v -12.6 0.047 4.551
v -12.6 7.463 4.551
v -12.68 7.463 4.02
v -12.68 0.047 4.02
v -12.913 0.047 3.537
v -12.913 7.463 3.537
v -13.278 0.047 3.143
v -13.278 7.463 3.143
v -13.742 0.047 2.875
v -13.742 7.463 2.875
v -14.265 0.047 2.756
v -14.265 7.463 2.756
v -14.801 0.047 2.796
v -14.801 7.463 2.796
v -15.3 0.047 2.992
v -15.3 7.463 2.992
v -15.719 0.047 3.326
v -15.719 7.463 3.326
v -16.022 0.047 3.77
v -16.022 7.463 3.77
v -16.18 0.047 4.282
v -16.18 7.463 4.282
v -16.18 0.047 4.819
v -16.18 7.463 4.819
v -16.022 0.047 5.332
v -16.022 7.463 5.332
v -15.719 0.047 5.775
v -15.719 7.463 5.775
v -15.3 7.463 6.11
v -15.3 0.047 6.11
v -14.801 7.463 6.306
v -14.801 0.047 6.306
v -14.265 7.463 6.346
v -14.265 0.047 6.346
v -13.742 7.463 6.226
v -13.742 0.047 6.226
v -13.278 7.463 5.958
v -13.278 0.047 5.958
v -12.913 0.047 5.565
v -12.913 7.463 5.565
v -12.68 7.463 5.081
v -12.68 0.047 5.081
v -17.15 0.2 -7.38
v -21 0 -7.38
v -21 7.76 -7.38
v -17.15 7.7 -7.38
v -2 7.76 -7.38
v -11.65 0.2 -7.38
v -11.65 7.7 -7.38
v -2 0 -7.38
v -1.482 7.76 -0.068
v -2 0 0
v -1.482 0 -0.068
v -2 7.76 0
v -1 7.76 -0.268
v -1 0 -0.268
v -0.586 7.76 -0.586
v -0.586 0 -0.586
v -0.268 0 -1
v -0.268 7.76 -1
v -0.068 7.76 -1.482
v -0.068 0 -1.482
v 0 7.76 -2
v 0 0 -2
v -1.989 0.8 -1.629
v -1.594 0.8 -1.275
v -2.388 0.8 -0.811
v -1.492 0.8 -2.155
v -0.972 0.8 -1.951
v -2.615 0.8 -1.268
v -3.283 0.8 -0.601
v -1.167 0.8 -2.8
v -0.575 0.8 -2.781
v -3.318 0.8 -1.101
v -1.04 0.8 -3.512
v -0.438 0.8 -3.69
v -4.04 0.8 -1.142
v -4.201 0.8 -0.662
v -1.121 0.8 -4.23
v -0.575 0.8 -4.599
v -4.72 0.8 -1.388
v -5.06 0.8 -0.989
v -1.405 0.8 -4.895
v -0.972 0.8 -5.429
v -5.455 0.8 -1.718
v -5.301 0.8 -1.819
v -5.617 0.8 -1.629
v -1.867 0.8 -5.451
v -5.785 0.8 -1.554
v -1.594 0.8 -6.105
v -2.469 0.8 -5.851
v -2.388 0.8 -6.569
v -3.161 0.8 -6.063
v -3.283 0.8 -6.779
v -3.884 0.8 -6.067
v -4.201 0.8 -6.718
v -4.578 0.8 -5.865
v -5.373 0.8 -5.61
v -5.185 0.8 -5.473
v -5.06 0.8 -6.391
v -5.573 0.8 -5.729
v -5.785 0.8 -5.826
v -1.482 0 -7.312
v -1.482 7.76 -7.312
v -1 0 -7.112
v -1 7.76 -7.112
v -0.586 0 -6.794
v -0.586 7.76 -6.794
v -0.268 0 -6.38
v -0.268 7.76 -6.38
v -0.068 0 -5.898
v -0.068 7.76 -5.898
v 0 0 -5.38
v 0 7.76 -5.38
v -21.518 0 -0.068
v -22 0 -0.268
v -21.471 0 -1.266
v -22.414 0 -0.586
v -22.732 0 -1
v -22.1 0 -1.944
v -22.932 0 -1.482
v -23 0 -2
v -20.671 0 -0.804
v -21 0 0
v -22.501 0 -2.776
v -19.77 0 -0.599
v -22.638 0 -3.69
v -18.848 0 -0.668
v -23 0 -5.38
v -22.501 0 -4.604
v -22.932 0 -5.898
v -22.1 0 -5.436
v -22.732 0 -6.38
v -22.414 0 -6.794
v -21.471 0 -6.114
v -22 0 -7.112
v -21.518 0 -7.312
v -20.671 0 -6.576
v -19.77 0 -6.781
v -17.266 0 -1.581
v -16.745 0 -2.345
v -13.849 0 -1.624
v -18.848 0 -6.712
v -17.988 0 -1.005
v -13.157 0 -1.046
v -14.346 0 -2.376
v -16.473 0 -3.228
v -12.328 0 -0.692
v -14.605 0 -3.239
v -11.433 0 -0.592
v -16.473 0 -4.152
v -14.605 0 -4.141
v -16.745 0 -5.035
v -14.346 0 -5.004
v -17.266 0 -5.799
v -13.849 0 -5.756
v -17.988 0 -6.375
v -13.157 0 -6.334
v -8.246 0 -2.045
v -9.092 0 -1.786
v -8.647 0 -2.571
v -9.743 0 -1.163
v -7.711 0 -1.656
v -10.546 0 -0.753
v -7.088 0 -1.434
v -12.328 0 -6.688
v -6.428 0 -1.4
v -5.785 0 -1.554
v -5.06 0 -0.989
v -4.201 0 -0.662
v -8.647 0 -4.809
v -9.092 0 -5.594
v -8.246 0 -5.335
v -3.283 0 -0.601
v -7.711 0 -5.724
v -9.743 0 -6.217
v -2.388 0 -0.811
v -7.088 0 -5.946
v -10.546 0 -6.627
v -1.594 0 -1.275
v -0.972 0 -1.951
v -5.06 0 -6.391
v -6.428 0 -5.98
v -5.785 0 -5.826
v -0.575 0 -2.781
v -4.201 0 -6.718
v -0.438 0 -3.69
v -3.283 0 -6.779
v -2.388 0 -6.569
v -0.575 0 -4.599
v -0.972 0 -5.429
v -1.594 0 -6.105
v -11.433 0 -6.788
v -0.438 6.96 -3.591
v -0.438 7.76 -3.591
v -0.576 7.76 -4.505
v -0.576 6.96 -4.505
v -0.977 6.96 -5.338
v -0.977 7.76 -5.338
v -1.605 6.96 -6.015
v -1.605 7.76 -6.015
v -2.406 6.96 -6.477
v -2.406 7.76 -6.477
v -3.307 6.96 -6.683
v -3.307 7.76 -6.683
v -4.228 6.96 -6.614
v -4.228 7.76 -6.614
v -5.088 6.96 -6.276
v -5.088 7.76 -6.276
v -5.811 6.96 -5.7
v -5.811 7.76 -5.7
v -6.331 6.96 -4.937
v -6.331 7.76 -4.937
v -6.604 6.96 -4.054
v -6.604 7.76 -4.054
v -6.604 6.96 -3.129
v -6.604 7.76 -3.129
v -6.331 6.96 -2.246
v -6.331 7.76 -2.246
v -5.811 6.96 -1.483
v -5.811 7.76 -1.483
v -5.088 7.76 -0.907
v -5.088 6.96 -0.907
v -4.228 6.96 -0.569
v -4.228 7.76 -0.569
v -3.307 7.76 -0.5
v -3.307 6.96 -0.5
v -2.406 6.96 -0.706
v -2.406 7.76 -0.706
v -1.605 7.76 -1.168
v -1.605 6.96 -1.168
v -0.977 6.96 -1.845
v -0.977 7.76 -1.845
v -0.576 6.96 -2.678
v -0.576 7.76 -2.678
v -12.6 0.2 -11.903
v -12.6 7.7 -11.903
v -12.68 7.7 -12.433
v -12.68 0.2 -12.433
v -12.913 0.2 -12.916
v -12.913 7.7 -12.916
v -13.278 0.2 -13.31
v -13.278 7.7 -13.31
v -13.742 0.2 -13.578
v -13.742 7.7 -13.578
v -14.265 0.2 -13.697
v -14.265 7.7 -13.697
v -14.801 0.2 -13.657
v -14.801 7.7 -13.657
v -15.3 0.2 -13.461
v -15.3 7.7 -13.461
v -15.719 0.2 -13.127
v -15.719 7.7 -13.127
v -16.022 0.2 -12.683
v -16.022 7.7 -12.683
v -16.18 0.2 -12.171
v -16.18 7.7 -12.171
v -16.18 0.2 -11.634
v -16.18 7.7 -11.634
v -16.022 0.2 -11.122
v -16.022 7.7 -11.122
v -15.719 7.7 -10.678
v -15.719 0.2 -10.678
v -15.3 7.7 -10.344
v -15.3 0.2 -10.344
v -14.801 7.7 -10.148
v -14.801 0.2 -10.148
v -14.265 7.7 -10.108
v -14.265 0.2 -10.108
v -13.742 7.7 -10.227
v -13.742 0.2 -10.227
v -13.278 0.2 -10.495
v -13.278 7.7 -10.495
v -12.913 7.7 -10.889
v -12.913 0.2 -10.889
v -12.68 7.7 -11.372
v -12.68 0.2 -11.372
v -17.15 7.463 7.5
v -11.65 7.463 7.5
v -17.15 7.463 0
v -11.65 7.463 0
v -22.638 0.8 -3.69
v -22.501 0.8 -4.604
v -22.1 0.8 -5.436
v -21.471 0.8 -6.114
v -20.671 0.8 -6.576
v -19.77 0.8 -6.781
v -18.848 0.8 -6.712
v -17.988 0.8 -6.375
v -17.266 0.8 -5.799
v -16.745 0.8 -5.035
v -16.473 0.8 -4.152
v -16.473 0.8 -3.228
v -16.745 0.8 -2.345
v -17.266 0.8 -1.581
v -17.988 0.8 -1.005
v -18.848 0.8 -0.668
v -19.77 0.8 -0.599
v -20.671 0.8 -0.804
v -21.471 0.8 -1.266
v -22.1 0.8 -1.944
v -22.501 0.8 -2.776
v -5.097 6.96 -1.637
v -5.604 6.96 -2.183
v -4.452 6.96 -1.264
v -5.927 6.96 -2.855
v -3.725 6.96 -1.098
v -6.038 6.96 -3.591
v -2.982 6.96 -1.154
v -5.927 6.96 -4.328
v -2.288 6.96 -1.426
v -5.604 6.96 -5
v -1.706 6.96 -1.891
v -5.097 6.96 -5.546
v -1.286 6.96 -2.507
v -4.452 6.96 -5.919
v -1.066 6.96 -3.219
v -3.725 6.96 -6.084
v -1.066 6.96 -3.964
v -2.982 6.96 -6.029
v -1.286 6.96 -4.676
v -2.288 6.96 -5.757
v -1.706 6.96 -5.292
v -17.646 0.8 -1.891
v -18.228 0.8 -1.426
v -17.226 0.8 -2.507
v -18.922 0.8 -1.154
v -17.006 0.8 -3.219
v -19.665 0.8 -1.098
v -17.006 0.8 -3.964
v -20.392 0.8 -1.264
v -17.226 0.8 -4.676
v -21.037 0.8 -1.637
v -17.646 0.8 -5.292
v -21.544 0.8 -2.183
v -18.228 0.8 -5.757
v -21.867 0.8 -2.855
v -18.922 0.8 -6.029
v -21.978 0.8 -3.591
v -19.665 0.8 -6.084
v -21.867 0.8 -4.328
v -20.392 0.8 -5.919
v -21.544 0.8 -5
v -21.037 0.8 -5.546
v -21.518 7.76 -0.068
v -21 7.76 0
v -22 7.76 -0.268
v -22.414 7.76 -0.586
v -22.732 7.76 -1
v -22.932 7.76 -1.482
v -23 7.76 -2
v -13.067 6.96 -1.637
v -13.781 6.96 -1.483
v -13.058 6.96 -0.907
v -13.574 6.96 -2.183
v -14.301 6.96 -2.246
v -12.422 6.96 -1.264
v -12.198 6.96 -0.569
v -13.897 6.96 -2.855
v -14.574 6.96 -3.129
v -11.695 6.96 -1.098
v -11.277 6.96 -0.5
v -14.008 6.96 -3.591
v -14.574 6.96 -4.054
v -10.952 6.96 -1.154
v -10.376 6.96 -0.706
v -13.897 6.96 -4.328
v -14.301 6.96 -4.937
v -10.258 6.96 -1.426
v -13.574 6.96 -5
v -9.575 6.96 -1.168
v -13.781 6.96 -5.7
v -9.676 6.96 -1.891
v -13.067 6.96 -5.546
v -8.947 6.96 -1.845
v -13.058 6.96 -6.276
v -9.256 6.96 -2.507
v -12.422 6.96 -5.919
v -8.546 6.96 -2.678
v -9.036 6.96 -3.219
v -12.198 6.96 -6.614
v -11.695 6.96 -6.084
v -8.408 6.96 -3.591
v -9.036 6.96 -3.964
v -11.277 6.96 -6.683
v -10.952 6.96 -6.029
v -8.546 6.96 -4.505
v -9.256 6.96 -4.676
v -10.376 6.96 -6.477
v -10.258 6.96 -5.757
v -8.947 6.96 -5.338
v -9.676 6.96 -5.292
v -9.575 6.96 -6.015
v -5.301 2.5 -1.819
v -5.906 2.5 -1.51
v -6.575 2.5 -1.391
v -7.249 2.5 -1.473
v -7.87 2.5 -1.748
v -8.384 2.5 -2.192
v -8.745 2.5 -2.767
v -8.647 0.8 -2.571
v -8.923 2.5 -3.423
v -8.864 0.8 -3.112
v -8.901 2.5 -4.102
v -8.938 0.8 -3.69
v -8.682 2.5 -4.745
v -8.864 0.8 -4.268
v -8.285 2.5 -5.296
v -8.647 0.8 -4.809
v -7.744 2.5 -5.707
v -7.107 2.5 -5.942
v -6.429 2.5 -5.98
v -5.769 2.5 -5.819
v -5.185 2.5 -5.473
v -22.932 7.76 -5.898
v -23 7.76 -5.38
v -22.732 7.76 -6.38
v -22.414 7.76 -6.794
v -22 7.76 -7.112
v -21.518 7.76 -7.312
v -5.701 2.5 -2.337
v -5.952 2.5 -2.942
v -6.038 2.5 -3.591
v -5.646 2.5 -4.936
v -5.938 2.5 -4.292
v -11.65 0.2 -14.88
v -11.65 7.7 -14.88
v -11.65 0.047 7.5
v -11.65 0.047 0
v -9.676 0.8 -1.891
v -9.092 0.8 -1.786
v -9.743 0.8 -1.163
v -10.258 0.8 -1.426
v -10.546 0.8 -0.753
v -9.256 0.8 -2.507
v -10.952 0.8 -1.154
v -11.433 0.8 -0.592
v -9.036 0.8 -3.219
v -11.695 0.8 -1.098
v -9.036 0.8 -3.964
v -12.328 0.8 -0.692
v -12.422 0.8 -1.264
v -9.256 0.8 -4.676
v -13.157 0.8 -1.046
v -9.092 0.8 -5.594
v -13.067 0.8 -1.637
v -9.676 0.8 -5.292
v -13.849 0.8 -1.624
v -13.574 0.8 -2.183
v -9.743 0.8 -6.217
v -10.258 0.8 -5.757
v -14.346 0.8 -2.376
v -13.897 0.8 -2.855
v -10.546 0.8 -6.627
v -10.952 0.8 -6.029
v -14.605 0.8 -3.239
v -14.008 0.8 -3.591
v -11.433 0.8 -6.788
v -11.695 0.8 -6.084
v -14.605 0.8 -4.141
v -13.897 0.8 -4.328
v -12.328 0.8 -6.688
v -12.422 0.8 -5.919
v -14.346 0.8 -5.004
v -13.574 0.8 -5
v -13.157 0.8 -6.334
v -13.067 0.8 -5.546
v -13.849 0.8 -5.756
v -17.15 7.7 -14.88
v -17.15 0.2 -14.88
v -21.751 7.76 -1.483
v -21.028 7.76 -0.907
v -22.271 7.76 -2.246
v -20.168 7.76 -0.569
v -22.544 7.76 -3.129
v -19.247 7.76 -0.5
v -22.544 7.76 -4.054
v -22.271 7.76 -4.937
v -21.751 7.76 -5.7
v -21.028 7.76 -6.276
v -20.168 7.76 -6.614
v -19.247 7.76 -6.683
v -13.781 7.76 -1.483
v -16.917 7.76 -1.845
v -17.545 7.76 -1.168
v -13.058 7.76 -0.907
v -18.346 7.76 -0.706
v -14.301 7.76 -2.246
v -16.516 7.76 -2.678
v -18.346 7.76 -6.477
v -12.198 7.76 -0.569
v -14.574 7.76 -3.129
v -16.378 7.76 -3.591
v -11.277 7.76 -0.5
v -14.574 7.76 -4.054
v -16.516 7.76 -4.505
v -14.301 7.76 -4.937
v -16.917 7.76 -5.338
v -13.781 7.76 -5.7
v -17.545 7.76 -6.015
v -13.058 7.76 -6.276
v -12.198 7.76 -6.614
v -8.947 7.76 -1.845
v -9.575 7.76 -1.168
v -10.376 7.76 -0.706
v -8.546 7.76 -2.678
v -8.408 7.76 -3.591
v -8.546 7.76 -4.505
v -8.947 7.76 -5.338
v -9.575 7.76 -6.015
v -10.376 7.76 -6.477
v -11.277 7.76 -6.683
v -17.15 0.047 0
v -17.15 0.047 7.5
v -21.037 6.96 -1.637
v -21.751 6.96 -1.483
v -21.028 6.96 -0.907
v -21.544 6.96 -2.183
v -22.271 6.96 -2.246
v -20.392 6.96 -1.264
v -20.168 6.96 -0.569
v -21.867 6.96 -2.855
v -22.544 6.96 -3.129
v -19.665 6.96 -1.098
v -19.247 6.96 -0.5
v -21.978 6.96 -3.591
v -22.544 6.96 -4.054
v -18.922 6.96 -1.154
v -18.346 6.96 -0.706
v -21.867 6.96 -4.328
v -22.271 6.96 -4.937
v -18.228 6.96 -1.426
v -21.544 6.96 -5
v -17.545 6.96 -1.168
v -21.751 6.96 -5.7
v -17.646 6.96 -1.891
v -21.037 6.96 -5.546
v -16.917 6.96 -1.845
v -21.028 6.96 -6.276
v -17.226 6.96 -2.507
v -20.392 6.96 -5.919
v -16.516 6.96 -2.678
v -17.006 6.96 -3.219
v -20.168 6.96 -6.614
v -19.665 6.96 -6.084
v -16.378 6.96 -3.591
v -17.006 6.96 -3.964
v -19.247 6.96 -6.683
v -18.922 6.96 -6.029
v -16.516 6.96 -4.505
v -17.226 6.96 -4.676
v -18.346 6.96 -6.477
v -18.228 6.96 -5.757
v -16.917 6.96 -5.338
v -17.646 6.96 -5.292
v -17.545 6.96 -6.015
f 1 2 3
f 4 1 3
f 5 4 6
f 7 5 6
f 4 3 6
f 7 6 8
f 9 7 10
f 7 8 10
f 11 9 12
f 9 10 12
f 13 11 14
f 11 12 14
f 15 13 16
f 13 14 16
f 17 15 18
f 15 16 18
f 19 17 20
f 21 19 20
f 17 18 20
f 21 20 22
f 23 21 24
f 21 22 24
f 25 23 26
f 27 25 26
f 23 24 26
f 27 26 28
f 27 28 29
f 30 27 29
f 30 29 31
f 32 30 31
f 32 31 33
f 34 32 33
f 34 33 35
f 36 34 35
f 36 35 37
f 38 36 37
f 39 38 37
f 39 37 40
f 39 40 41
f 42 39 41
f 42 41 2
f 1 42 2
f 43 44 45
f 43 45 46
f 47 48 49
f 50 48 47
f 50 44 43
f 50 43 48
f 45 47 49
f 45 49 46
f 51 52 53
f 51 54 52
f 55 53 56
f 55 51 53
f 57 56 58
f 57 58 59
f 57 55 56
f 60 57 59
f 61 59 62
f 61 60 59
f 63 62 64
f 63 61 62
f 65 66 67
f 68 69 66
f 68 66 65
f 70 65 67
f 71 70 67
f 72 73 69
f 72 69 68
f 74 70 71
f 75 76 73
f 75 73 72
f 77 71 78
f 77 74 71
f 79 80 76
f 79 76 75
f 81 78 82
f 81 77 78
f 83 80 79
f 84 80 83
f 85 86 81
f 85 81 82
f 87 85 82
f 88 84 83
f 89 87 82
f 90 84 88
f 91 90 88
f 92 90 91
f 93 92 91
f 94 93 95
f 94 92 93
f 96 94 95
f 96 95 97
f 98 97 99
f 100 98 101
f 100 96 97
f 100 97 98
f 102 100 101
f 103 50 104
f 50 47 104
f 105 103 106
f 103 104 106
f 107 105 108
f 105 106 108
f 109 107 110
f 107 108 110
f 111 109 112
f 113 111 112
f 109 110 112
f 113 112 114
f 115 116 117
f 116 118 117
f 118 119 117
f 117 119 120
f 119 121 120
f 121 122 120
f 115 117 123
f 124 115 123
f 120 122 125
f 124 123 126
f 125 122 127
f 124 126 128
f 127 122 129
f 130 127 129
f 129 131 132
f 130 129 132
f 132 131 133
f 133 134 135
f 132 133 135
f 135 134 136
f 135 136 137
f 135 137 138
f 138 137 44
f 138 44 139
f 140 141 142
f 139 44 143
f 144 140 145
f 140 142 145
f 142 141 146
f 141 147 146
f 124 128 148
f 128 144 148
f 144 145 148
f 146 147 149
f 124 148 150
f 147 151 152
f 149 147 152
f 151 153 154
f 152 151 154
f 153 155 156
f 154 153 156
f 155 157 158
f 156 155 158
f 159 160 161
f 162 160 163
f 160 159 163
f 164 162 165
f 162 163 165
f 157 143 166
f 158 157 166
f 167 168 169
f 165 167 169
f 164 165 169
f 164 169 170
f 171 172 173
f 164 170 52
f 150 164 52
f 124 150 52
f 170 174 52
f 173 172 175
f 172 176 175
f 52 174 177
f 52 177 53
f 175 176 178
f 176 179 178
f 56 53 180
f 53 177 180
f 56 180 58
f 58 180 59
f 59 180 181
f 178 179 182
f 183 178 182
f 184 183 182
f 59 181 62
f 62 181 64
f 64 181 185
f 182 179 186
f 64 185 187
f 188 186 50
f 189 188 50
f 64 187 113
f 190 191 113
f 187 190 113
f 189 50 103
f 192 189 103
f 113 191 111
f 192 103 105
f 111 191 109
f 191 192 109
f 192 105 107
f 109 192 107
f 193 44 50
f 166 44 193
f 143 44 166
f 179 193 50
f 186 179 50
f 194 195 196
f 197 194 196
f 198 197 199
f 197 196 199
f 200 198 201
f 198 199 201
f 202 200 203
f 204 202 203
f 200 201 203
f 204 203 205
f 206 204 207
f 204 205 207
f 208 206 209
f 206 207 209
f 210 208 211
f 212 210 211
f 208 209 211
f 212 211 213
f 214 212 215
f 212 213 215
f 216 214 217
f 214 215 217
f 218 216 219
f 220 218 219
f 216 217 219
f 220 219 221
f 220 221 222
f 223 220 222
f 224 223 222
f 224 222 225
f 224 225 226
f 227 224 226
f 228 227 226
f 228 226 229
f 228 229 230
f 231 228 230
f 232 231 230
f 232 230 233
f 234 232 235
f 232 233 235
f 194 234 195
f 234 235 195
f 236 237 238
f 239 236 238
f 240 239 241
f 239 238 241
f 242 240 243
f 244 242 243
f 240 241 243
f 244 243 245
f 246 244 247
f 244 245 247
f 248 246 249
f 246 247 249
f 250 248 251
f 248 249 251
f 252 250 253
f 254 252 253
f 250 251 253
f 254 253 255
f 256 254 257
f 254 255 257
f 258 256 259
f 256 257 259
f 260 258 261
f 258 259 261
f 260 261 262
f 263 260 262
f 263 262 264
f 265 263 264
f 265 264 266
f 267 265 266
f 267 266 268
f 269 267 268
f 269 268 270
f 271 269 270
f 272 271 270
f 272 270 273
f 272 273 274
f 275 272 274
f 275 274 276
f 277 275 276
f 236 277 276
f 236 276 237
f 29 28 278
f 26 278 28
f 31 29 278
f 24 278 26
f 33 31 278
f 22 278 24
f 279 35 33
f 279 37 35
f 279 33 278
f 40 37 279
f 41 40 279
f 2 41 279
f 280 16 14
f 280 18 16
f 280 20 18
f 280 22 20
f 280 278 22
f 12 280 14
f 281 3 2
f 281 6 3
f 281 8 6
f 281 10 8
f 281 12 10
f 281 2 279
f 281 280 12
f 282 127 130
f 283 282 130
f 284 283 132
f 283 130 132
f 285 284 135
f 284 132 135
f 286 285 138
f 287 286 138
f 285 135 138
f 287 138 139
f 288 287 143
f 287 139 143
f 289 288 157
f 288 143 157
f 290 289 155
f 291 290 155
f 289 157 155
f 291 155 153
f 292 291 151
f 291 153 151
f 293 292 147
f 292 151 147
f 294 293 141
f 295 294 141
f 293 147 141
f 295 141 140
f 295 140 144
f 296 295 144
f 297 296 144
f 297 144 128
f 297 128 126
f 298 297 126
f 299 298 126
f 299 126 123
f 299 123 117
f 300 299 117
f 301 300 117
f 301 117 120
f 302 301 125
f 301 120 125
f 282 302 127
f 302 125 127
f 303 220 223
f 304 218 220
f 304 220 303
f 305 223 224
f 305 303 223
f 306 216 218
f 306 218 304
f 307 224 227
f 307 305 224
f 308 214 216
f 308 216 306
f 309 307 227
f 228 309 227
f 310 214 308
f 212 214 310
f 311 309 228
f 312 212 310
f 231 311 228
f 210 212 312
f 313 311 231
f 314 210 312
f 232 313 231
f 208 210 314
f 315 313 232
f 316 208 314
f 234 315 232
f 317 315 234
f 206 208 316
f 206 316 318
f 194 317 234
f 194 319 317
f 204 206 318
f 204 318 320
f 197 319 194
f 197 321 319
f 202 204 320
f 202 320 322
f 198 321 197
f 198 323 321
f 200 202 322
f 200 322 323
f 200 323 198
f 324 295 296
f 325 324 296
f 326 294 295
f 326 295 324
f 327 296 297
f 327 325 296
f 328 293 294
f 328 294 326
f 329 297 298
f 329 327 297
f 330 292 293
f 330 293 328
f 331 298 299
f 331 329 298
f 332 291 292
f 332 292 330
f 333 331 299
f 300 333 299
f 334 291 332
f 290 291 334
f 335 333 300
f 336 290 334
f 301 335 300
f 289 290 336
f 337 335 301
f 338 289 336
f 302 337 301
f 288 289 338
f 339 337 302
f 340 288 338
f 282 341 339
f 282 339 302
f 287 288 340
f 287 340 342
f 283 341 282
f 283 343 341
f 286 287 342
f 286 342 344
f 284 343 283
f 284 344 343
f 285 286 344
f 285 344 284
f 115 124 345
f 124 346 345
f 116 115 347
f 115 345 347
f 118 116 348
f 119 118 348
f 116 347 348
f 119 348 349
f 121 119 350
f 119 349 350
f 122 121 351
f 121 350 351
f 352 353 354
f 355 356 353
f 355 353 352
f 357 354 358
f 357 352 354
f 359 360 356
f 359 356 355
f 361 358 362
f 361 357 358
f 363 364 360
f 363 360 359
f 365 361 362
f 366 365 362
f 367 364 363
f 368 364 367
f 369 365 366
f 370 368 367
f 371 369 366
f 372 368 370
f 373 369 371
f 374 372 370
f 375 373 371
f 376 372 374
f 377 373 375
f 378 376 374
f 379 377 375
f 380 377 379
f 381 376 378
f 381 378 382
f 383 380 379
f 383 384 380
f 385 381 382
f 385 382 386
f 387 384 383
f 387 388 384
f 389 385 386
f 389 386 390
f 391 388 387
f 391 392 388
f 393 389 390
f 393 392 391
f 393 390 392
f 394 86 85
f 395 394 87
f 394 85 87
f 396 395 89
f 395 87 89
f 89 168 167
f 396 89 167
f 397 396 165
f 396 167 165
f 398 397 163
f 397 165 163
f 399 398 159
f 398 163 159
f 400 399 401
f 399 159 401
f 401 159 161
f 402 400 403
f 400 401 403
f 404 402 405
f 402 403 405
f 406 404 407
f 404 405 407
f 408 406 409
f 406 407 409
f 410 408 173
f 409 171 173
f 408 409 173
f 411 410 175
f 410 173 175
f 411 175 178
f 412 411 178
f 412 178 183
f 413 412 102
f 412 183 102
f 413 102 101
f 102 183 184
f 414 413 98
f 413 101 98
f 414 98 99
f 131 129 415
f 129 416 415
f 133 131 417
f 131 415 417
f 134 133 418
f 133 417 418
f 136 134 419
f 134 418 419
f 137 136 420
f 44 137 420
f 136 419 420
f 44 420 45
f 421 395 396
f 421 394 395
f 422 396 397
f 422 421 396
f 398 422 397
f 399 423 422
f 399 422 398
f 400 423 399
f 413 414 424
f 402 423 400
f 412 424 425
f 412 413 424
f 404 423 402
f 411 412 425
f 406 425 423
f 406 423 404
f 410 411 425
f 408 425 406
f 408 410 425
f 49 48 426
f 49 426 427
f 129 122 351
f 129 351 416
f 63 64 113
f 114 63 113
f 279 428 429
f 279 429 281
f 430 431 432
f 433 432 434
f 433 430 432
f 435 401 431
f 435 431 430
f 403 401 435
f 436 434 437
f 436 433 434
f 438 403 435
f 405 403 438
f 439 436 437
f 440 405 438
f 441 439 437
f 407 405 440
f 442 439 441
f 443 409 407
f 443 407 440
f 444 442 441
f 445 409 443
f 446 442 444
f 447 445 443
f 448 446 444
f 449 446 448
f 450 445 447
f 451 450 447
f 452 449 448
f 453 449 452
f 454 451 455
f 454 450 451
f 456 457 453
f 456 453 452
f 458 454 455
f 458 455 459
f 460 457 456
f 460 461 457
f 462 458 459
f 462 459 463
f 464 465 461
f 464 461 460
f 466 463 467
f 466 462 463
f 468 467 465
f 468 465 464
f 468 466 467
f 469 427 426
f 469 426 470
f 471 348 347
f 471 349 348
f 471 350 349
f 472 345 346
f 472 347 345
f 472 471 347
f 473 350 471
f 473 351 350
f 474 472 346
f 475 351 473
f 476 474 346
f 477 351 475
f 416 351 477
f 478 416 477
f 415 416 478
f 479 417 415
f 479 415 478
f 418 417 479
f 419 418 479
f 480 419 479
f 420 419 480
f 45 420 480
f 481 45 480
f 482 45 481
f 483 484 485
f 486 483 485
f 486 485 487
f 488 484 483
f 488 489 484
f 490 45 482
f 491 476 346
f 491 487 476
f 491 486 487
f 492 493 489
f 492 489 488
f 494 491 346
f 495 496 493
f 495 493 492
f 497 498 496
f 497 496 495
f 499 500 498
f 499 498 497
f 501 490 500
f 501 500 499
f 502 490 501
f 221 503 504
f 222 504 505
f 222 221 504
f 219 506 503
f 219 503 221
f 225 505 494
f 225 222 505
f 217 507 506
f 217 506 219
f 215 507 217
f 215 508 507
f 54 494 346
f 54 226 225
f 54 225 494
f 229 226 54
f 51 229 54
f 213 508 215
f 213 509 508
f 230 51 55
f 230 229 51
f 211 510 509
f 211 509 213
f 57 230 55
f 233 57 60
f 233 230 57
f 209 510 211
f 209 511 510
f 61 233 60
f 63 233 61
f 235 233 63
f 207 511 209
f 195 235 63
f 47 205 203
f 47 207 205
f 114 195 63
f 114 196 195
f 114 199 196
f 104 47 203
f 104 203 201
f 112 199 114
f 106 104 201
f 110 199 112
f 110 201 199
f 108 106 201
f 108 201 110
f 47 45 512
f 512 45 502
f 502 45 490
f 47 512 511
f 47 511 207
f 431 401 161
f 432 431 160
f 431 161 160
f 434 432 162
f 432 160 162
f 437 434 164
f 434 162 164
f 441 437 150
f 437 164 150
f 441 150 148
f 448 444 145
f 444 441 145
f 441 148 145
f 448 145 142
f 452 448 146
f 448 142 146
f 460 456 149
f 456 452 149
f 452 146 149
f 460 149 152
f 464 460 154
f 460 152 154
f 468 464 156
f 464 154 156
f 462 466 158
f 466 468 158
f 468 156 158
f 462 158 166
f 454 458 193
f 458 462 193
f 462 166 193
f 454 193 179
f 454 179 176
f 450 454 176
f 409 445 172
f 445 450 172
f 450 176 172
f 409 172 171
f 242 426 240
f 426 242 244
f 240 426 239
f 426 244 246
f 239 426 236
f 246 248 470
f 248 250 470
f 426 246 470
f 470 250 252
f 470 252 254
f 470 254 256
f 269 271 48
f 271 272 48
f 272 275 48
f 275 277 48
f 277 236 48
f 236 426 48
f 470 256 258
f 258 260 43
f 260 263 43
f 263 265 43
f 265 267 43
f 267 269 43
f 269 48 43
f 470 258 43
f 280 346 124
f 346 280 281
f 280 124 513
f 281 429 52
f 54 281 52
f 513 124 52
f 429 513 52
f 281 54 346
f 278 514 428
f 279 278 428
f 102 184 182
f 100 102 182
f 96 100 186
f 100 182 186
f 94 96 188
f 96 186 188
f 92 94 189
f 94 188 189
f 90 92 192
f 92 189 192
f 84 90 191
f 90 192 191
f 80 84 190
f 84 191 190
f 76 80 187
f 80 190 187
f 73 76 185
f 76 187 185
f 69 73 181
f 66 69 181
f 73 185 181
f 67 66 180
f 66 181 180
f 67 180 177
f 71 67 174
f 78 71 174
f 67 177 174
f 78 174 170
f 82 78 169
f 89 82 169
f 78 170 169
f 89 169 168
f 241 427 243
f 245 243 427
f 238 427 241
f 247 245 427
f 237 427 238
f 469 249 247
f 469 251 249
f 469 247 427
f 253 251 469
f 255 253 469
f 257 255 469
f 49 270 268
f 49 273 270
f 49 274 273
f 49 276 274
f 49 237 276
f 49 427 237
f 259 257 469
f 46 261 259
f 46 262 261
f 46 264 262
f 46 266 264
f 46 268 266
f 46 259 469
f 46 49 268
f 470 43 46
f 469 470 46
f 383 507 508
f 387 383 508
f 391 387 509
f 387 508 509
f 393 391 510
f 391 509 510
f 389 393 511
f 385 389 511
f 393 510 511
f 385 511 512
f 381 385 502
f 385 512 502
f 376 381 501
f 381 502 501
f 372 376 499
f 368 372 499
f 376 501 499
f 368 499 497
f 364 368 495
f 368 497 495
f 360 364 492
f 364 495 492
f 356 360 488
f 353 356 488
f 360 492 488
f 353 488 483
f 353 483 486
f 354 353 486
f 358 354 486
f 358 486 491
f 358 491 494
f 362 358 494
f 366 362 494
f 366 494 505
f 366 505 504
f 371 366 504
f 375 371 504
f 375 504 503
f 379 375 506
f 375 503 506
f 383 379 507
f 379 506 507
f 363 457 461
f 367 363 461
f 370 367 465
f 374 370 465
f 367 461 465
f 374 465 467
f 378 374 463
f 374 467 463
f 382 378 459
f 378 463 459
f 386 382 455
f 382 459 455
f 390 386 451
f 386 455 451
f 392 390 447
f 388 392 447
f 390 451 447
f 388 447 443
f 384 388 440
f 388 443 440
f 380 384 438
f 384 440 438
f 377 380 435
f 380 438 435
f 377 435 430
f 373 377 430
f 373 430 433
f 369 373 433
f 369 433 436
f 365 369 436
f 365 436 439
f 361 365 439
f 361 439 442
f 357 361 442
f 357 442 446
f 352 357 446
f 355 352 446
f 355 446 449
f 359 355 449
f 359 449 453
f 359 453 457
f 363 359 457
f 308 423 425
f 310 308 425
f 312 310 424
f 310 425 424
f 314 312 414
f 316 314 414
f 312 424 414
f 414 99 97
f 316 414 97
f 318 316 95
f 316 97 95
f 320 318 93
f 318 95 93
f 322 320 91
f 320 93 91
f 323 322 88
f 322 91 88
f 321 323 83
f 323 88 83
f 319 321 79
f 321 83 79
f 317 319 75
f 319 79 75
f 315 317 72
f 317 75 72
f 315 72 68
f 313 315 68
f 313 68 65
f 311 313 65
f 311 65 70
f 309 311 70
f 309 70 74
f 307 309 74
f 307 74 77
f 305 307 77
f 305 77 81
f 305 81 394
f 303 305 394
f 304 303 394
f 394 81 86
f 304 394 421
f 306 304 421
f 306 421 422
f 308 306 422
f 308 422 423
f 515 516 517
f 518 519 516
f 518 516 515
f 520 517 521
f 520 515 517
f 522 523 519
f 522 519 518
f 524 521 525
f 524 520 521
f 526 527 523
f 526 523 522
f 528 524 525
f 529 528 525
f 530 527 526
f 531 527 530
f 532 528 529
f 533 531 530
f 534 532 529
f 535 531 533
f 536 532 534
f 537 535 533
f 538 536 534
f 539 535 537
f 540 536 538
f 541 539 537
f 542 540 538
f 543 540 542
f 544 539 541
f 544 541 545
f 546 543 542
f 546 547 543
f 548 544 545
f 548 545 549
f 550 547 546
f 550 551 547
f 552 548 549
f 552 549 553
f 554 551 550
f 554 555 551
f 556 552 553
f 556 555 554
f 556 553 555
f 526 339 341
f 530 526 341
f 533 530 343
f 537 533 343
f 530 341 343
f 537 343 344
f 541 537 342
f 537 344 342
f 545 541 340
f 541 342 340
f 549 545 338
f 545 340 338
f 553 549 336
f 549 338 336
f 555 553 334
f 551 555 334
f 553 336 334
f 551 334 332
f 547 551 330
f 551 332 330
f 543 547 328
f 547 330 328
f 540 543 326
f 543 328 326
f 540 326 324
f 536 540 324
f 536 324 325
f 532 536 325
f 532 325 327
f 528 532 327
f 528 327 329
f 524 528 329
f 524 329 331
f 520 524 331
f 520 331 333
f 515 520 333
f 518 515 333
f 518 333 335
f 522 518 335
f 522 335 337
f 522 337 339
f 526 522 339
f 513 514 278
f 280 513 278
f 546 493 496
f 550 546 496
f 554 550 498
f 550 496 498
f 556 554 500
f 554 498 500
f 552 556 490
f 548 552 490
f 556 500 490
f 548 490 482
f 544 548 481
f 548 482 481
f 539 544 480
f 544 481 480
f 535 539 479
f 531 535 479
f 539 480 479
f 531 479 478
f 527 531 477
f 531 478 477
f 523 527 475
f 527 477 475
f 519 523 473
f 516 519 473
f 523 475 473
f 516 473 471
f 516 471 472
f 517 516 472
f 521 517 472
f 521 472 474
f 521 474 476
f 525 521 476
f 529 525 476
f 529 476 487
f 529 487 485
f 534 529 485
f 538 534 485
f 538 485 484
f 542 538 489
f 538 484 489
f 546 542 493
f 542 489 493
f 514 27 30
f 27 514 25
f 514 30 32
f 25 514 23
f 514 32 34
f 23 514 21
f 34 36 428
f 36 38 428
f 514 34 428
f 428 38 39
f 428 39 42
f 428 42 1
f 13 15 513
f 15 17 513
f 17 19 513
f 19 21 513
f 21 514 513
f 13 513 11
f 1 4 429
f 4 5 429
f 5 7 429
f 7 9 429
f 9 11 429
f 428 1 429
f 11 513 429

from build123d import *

# Parameters (mm, degrees)
SKETCH3_W           = 23
SKETCH3_H           = 7.38
BOSS_EXTRUDE1_DEPTH = 7.76
SKETCH4_R           = 3.1
CUT_EXTRUDE2_DEPTH  = 0.8
SKETCH7_R           = 3.1
CUT_EXTRUDE3_DEPTH  = 0.8
SKETCH6_R           = 2.5
CUT_EXTRUDE4_DEPTH  = 7.96
FILLET3_R           = 2
FILLET4_R           = 2
FILLET5_R           = 2
FILLET6_R           = 2
SKETCH8_W           = 5.5
SKETCH8_H           = 7.500541727
BOSS_EXTRUDE2_DEPTH = 7.5
SKETCH12_W          = 5.5
SKETCH12_H          = 7.41549866
BOSS_EXTRUDE4_DEPTH = 7.5
SKETCH9_R           = 1.8
CUT_EXTRUDE5_DEPTH  = 20.6
SKETCH13_R          = 1.8
CUT_EXTRUDE6_DEPTH  = 20.6
SKETCH14_R          = 2.3
CUT_EXTRUDE7_DEPTH  = 2.5


with BuildPart() as part:
    # Sketch3 → Boss-Extrude1 (new body)
    with BuildSketch(Plane(origin=(0, 0, 0), x_dir=(1, 0, 0), z_dir=(0, 1, 0))):
        with Locations((-11.5, 3.69)):
            Rectangle(SKETCH3_W, SKETCH3_H)
    extrude(amount=BOSS_EXTRUDE1_DEPTH)

    # Sketch4 → Cut-Extrude2 (cut)
    with BuildSketch(Plane(origin=(0, 0, 0), x_dir=(-1, 0, 0), z_dir=(0, -1, 0))):
        with Locations((19.538269405, 3.69)):
            Circle(SKETCH4_R)
        with Locations((11.538269405, 3.69)):
            Circle(SKETCH4_R)
        with Locations((3.538269405, 3.69)):
            Circle(SKETCH4_R)
    extrude(amount=-CUT_EXTRUDE2_DEPTH, mode=Mode.SUBTRACT)

    # Sketch7 → Cut-Extrude3 (cut)
    with BuildSketch(Plane(origin=(0, 7.76, 0), x_dir=(1, 0, 0), z_dir=(0, 1, 0))):
        with Locations((-19.478269405, 3.591470107)):
            Circle(SKETCH7_R)
        with Locations((-11.508269405, 3.591470107)):
            Circle(SKETCH7_R)
        with Locations((-3.538269405, 3.591470107)):
            Circle(SKETCH7_R)
    extrude(amount=-CUT_EXTRUDE3_DEPTH, mode=Mode.SUBTRACT)

    # Sketch6 → Cut-Extrude4 (cut, through all)
    with BuildSketch(Plane(origin=(0, 0.8, 0), x_dir=(-1, 0, 0), z_dir=(0, -1, 0))):
        with Locations((3.538269405, 3.591470107)):
            Circle(SKETCH6_R)
        with Locations((11.508269405, 3.591470107)):
            Circle(SKETCH6_R)
        with Locations((19.478269405, 3.591470107)):
            Circle(SKETCH6_R)
    extrude(amount=-CUT_EXTRUDE4_DEPTH, mode=Mode.SUBTRACT)

    # Fillet3
    fillet3_edges = [part.edges().sort_by_distance(p)[0] for p in [
        (0, 3.88, 0),
    ]]
    fillet(fillet3_edges, radius=FILLET3_R)

    # Fillet4
    fillet4_edges = [part.edges().sort_by_distance(p)[0] for p in [
        (-23, 3.88, 0),
    ]]
    fillet(fillet4_edges, radius=FILLET4_R)

    # Fillet5
    fillet5_edges = [part.edges().sort_by_distance(p)[0] for p in [
        (-23, 3.88, -7.38),
    ]]
    fillet(fillet5_edges, radius=FILLET5_R)

    # Fillet6
    fillet6_edges = [part.edges().sort_by_distance(p)[0] for p in [
        (0, 3.88, -7.38),
    ]]
    fillet(fillet6_edges, radius=FILLET6_R)

    # Sketch8 → Boss-Extrude2 (add)
    with BuildSketch(Plane(origin=(0, 0, -7.38), x_dir=(-1, 0, 0), z_dir=(0, 0, -1))):
        with Locations((14.4, 3.949980596)):
            Rectangle(SKETCH8_W, SKETCH8_H)
    extrude(amount=BOSS_EXTRUDE2_DEPTH)

    # Sketch12 → Boss-Extrude4 (add)
    with BuildSketch(Plane.XY):
        with Locations((-14.4, 3.755058696)):
            Rectangle(SKETCH12_W, SKETCH12_H)
    extrude(amount=BOSS_EXTRUDE4_DEPTH)

    # Sketch9 → Cut-Extrude5 (cut)
    with BuildSketch(Plane(origin=(0, 7.700251459, 0), x_dir=(1, 0, 0), z_dir=(0, 1, 0))):
        with Locations((-14.4, 11.902505055)):
            Circle(SKETCH9_R)
    extrude(amount=-CUT_EXTRUDE5_DEPTH, mode=Mode.SUBTRACT)

    # Sketch13 → Cut-Extrude6 (cut)
    with BuildSketch(Plane(origin=(0, 7.462808026, 0), x_dir=(1, 0, 0), z_dir=(0, 1, 0))):
        with Locations((-14.4, -4.550661236)):
            Circle(SKETCH13_R)
    extrude(amount=-CUT_EXTRUDE6_DEPTH, mode=Mode.SUBTRACT)

    # Sketch14 → Cut-Extrude7 (cut)
    with BuildSketch(Plane(origin=(0, 0, 0), x_dir=(-1, 0, 0), z_dir=(0, -1, 0))):
        with Locations((6.638269405, 3.69)):
            Circle(SKETCH14_R)
    extrude(amount=-CUT_EXTRUDE7_DEPTH, mode=Mode.SUBTRACT)


solid = part.part
